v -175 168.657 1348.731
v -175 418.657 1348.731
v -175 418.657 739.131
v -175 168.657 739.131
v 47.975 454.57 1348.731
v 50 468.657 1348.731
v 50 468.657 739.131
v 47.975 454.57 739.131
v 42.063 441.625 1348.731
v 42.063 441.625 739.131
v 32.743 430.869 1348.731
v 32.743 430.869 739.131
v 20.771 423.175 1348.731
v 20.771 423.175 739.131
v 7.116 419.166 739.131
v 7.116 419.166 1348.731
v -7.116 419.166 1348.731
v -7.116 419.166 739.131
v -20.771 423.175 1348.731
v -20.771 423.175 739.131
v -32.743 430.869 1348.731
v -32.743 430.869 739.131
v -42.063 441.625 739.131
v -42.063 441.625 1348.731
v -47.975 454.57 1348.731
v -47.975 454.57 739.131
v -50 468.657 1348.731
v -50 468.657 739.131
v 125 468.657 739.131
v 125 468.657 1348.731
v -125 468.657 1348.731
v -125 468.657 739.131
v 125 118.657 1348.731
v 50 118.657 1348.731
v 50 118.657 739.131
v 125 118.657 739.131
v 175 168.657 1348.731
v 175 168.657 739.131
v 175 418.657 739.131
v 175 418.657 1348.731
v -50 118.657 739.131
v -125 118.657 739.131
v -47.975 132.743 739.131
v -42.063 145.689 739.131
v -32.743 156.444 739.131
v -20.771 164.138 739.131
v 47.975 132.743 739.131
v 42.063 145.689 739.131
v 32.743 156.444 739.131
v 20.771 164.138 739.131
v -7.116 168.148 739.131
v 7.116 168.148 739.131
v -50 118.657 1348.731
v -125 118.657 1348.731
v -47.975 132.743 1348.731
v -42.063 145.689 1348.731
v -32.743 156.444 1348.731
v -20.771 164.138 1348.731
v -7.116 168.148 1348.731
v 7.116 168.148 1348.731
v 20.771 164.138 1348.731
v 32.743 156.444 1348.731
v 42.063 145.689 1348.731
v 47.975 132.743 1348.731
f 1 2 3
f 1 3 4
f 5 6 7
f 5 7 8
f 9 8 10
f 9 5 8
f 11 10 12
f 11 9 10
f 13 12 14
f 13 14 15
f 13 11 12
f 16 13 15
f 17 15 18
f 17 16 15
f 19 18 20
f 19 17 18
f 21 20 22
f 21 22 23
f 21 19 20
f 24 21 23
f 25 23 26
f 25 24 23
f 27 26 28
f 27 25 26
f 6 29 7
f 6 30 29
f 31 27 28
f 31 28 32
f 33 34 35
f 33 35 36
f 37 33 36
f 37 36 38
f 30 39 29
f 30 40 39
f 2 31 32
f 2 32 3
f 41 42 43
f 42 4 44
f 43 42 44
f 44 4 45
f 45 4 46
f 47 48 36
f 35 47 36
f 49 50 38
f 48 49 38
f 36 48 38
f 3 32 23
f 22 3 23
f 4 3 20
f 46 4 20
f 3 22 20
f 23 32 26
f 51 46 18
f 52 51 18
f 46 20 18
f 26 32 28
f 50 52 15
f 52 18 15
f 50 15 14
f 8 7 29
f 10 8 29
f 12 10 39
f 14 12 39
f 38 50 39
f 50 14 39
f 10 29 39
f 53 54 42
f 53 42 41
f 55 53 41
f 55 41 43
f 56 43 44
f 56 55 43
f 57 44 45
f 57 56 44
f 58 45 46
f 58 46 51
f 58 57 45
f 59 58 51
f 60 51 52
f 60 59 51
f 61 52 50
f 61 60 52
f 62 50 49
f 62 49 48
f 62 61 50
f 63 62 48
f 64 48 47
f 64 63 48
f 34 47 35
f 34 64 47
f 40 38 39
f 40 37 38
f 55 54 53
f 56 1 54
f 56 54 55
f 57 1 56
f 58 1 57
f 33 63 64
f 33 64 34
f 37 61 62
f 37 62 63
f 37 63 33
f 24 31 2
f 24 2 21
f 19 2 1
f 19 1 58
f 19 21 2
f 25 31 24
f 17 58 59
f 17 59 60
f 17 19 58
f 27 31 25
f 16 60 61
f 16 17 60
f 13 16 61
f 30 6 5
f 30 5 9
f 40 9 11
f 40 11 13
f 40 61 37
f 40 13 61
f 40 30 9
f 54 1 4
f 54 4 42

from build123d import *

# Parameters (mm, degrees)
COCKPIT_TEMPLATE_DEPTH = 304.8


with BuildPart() as part:
    # Sketch11 → Cockpit Template (new, symmetric)
    with BuildSketch(Plane.XY.offset(1043.931203382)):
        with BuildLine():
            Line((125, 468.656673601), (50, 468.656673601))
            ThreePointArc((50, 468.656673601), (0, 418.656673601), (-50, 468.656673601))
            Line((-50, 468.656673601), (-125, 468.656673601))
            Line((-125, 468.656673601), (-175, 418.656673601))
            Line((-175, 418.656673601), (-175, 168.656673601))
            Line((-175, 168.656673601), (-125, 118.656673601))
            Line((-125, 118.656673601), (-50, 118.656673601))
            ThreePointArc((-50, 118.656673601), (0, 168.656673601), (50, 118.656673601))
            Line((50, 118.656673601), (125, 118.656673601))
            Line((125, 118.656673601), (175, 168.656673601))
            Line((175, 168.656673601), (175, 418.656673601))
            Line((175, 418.656673601), (125, 468.656673601))
        make_face()
    extrude(amount=COCKPIT_TEMPLATE_DEPTH, both=True)


solid = part.part
